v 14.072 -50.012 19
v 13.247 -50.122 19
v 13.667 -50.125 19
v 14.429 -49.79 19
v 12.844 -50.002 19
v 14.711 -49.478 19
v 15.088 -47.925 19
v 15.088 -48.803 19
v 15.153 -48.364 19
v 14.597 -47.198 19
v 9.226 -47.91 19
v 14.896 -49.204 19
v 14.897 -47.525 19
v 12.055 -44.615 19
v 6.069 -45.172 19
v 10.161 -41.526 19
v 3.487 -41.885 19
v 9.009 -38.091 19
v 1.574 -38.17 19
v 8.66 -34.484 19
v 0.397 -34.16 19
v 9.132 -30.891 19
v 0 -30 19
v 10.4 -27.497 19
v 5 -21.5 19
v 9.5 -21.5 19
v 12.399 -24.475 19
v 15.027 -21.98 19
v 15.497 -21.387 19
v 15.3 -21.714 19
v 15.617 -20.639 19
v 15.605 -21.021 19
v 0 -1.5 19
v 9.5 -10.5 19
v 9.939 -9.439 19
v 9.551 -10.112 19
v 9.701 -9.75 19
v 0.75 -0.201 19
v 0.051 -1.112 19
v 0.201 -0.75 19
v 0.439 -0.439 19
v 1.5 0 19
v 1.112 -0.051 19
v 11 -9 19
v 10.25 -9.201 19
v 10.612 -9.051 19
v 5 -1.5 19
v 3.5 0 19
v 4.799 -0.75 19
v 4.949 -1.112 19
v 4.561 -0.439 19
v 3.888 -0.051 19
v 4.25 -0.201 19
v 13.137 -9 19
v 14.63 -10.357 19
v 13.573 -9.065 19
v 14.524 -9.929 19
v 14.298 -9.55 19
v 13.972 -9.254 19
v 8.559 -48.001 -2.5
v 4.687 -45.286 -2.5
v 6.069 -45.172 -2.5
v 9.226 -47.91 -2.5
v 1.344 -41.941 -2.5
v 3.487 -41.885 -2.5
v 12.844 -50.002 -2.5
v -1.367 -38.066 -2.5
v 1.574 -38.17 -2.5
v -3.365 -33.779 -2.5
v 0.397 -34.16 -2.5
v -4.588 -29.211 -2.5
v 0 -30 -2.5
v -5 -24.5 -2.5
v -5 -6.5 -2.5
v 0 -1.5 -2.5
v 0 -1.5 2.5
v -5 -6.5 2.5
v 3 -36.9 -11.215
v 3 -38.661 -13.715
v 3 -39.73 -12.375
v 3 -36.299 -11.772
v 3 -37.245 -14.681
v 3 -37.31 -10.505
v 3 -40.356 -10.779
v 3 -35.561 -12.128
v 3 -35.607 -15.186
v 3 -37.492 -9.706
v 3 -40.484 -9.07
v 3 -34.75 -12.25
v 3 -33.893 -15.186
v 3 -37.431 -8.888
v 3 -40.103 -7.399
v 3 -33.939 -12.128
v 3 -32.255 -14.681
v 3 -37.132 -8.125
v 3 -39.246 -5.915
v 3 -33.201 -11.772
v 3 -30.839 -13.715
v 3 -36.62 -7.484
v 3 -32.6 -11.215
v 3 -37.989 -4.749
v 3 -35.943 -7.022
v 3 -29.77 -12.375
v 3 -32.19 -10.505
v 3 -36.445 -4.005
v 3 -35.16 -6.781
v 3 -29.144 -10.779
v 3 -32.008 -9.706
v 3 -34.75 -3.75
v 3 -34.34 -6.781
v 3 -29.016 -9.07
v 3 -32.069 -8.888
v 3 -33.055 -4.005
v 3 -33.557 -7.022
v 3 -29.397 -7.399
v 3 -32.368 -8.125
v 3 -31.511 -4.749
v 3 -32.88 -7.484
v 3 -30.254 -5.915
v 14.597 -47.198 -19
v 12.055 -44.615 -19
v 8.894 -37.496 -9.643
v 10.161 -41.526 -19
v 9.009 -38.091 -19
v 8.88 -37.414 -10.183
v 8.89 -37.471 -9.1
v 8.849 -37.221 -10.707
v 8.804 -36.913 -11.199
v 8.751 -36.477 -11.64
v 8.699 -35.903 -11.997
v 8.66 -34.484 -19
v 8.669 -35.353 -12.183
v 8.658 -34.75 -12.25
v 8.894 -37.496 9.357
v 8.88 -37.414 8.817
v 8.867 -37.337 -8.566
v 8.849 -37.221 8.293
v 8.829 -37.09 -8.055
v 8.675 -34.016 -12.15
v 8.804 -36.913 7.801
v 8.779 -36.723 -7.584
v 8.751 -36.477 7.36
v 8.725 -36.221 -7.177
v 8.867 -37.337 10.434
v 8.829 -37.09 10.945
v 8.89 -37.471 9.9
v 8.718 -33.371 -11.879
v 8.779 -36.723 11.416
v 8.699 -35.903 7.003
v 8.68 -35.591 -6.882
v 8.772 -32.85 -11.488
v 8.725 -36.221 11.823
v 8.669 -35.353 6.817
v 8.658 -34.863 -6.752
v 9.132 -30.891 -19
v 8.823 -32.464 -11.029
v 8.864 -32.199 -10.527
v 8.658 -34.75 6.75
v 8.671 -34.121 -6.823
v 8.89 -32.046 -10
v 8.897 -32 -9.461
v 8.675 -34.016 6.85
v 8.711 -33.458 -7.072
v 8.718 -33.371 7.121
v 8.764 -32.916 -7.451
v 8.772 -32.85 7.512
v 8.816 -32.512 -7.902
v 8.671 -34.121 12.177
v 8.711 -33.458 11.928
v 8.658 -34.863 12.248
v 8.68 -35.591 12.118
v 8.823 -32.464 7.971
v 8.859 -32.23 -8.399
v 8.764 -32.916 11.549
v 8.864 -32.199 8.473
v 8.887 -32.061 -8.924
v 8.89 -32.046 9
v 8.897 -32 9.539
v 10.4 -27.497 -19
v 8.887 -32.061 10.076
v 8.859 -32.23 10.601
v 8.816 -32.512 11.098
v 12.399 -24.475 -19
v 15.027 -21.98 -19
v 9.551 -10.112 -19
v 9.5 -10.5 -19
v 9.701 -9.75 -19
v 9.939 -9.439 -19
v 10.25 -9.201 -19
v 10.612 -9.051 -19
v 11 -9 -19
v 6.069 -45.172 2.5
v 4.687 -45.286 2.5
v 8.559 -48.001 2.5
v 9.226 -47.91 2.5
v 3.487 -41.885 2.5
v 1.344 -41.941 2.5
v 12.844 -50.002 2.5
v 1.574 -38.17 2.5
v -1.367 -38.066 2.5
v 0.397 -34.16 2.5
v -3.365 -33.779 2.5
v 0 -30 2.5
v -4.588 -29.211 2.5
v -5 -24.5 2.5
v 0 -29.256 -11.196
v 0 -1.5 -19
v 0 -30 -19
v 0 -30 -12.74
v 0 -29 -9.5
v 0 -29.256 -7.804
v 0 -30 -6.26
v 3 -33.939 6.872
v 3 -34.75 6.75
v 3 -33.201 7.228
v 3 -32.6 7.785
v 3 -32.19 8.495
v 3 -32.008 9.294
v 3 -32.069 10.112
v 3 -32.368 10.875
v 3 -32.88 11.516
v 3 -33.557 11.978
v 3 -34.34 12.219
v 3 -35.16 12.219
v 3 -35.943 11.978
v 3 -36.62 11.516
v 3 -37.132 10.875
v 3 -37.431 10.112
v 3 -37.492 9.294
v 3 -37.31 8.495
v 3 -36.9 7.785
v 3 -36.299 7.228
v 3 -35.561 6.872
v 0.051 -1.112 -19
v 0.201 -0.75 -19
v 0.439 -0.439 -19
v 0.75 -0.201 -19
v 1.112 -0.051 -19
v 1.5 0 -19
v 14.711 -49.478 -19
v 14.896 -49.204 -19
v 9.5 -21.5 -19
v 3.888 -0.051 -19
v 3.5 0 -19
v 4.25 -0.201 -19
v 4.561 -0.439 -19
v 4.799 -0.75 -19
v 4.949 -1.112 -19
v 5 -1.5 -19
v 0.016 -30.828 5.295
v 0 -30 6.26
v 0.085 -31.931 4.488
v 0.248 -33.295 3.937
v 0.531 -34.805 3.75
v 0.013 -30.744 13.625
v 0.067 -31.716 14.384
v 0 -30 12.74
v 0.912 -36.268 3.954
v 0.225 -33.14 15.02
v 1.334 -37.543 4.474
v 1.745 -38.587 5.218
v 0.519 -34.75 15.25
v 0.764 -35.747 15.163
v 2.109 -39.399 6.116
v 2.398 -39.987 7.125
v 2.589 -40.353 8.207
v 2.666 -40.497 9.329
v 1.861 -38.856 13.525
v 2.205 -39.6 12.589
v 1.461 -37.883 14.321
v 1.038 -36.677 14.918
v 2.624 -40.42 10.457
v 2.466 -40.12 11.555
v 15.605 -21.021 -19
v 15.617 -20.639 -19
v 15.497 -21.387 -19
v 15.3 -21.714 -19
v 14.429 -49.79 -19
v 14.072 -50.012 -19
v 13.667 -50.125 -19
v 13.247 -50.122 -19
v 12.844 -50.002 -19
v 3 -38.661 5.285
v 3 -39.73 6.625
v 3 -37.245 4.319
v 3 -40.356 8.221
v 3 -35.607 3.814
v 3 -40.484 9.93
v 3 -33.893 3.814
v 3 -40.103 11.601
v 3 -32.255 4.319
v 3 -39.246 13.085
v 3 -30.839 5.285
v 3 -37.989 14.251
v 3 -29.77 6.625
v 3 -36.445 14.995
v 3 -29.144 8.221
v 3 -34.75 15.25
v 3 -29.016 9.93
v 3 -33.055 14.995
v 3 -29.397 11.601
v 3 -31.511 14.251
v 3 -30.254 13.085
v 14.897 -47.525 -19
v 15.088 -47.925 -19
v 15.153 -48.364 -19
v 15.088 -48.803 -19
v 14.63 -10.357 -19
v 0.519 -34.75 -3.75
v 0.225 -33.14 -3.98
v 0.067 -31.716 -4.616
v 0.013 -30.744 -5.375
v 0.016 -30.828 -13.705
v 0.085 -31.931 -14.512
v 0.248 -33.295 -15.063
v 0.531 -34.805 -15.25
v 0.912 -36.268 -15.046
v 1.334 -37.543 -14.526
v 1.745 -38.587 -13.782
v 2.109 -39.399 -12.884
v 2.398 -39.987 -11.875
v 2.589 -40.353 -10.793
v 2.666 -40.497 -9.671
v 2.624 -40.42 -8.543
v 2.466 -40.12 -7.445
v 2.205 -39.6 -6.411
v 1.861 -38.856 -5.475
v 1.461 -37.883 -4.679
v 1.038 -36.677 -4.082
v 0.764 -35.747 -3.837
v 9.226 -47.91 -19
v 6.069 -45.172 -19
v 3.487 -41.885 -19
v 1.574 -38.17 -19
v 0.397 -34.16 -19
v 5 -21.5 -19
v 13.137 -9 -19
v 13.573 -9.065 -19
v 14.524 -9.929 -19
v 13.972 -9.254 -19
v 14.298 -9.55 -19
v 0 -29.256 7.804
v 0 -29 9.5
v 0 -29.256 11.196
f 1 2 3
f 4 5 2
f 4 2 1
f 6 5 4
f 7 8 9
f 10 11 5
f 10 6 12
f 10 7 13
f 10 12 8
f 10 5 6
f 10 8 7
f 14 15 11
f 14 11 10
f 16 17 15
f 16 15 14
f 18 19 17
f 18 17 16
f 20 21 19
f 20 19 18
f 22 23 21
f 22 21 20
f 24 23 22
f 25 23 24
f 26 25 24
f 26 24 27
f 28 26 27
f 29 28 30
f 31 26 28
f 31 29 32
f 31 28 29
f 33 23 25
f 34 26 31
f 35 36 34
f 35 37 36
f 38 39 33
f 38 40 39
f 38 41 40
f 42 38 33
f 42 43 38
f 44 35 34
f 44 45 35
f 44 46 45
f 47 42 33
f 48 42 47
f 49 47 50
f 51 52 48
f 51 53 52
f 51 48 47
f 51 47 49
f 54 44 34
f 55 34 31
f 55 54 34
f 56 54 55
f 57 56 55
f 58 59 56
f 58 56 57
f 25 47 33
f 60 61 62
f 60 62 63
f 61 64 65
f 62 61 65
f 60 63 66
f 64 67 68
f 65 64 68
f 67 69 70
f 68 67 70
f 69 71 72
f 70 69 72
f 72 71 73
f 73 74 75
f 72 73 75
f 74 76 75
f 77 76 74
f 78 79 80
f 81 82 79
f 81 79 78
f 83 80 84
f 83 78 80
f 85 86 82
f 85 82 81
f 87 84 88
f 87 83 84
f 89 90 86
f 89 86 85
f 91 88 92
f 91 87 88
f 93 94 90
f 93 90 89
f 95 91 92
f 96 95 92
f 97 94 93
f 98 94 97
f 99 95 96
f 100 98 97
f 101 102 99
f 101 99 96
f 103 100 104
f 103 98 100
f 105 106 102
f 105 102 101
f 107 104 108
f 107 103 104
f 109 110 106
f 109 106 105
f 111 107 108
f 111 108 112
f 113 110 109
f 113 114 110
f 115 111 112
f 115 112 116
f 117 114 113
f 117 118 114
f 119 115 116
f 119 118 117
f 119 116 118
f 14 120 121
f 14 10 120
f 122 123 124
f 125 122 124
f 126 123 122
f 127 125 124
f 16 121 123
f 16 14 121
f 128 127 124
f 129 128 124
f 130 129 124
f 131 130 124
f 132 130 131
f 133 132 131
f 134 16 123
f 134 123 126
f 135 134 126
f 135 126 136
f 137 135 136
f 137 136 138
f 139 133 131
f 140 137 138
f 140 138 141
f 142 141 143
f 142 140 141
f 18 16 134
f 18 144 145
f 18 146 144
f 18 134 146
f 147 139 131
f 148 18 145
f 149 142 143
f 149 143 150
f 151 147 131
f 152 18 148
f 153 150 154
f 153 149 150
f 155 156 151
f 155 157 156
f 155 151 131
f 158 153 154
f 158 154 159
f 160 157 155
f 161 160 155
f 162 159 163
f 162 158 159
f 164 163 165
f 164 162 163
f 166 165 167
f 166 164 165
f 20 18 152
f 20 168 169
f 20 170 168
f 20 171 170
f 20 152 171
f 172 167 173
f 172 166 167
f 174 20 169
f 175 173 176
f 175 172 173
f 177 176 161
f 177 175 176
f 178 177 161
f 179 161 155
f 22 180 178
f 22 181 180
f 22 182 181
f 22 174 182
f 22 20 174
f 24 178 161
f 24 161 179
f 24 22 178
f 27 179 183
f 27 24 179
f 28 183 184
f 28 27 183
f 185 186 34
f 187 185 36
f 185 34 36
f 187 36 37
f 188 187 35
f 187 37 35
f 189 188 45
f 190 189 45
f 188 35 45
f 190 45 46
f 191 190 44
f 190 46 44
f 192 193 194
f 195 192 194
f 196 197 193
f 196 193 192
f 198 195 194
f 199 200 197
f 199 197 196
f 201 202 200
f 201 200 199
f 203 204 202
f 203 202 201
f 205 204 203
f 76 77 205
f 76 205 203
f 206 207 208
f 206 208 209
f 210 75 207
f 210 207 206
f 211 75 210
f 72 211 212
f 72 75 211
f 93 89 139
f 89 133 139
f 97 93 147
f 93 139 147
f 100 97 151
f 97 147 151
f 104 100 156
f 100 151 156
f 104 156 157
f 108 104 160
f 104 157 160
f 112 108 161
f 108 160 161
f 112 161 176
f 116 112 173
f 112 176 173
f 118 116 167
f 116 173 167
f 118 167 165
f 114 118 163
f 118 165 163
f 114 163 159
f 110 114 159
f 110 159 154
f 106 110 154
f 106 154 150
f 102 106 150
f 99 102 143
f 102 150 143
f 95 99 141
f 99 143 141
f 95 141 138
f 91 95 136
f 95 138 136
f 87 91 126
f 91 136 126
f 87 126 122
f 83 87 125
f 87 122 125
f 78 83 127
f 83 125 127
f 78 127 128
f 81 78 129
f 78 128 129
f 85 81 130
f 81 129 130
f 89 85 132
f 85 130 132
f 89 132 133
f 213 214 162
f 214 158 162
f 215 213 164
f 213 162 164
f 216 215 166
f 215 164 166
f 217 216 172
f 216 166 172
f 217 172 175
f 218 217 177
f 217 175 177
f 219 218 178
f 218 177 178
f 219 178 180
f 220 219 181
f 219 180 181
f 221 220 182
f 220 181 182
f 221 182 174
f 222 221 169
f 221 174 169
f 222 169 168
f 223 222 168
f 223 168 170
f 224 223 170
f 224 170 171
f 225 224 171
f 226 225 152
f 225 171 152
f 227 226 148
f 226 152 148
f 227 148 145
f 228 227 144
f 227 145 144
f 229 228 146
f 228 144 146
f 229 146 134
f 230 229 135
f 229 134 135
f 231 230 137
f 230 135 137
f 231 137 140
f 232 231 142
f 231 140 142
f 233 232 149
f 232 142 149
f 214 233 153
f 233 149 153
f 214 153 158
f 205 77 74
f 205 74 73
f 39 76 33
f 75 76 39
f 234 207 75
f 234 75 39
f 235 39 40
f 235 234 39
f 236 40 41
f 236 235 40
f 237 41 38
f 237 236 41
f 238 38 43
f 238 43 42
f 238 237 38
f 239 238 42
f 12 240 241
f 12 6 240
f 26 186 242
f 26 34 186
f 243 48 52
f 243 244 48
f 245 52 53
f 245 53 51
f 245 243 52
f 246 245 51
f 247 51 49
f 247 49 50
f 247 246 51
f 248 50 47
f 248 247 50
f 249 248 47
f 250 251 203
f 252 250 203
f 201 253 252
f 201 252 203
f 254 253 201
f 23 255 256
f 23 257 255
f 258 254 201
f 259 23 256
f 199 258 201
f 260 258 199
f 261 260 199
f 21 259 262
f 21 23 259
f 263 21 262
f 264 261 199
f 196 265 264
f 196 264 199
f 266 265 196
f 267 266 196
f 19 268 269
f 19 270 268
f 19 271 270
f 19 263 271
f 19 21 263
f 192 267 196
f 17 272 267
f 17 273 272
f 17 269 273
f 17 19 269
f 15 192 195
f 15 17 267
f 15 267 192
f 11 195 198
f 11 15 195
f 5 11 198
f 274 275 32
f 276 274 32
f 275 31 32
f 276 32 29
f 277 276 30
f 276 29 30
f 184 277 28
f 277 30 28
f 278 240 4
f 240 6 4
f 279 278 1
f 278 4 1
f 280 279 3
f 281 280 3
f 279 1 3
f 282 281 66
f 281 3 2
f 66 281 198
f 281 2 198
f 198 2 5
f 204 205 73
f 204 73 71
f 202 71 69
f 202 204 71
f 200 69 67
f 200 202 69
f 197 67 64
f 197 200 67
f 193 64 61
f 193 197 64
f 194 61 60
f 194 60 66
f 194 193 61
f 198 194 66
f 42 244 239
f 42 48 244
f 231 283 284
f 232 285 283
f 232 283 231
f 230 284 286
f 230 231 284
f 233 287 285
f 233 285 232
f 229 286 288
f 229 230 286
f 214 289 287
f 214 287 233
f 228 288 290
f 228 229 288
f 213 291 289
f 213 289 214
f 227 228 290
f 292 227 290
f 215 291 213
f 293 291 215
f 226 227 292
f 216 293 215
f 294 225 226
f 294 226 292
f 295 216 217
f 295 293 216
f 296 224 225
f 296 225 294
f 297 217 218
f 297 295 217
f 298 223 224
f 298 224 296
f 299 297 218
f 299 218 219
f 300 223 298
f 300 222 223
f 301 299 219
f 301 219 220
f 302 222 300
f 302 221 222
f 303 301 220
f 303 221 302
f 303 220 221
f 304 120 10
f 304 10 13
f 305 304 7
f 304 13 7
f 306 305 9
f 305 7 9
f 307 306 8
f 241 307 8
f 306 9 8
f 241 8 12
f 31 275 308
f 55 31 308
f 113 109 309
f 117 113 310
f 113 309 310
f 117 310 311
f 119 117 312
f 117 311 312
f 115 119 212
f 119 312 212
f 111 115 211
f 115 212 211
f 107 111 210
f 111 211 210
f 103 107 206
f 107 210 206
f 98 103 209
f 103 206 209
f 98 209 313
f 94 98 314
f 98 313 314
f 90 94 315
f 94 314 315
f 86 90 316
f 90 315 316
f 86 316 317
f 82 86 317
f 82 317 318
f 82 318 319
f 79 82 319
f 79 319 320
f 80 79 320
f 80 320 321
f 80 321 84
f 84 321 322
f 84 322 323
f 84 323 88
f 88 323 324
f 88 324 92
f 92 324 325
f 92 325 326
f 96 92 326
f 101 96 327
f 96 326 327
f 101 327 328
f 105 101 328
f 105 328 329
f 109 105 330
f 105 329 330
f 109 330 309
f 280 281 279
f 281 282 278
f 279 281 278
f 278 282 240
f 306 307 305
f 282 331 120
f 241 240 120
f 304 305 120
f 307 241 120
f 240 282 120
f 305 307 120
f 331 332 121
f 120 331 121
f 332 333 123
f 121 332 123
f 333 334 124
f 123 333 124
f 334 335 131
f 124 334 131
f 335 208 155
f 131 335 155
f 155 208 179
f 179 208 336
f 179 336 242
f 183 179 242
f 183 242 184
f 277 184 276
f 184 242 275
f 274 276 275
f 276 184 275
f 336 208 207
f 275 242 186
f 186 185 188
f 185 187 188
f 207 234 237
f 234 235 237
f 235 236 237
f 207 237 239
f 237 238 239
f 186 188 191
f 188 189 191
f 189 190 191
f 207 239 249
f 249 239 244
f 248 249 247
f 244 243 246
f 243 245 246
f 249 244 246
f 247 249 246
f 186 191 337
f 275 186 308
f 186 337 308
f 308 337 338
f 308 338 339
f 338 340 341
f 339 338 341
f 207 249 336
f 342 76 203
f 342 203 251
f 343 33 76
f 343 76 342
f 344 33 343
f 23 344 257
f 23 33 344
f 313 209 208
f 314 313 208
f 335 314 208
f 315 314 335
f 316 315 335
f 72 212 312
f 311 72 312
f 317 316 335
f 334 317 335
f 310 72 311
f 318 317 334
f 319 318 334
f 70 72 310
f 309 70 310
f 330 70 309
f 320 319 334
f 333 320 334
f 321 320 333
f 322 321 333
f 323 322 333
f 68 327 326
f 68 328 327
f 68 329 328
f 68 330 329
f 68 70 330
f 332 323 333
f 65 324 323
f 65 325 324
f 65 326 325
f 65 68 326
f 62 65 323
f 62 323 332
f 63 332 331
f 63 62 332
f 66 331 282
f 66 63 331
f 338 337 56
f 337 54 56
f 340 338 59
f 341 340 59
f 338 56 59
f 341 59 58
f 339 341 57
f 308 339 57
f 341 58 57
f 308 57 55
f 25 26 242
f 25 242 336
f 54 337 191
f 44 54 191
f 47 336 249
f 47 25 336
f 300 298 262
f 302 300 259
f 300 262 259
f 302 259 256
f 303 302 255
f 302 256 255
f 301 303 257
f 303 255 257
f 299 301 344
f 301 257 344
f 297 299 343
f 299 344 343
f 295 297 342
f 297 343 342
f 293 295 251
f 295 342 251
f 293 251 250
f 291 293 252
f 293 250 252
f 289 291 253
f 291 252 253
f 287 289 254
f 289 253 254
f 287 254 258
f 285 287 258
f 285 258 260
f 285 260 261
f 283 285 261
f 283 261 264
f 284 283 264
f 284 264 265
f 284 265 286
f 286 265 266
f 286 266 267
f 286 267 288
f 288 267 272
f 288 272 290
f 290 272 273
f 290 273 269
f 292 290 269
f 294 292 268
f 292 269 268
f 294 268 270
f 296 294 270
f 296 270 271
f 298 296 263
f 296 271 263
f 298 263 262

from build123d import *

# Parameters (mm, degrees)
RESSALTO_EXTRUS_O1_DEPTH                             = 19
FILETE1_R                                            = 1.5
RESSALTO_EXTRUS_O2_DEPTH                             = 2.5
REBAIXO_PARA_PARAFUSO_ALLEN_SEXTAVADO_DE_D           = 5.5
REBAIXO_PARA_PARAFUSO_ALLEN_SEXTAVADO_DE_CBORE_D     = 11.5
REBAIXO_PARA_PARAFUSO_ALLEN_SEXTAVADO_DE_CBORE_DEPTH = 3


with BuildPart() as part:
    # Esboço1 → Ressalto-extrusão1 (new, symmetric)
    with BuildSketch(Plane.XY):
        with BuildLine():
            Line((0, 0), (0, -30))
            ThreePointArc((0, -30), (3.840309651, -42.417932709), (14.020349891, -50.5))
            Line((14.020349891, -50.5), (15.7, -48.014285714))
            ThreePointArc((15.7, -48.014285714), (8.658133916, -34.757142857), (15.7, -21.5))
            Line((15.7, -21.5), (14.5, -9))
            Line((14.5, -9), (9.5, -9))
            Line((9.5, -9), (9.5, -21.5))
            Line((9.5, -21.5), (5, -21.5))
            Line((5, -21.5), (5, 0))
            Line((5, 0), (0, 0))
        make_face()
    extrude(amount=RESSALTO_EXTRUS_O1_DEPTH, both=True)

    # Filete1
    filete1_edges = [part.edges().sort_by_distance(p)[0] for p in [
        (5, 0, 0),
        (9.5, -9, 0),
        (14.5, -9, 0),
        (15.7, -21.5, 0),
        (15.7, -48.014285714, 0),
        (14.020349891, -50.5, 0),
        (0, 0, 0),
    ]]
    fillet(filete1_edges, radius=FILETE1_R)

    # Esboço3 → Ressalto-extrusão2 (add, symmetric)
    with BuildSketch(Plane.XY):
        with BuildLine():
            Line((0, -1.5), (-5, -6.5))
            Line((-5, -6.5), (-5, -24.5))
            ThreePointArc((-5, -24.5), (-0.096122461, -40.062531476), (12.8437502, -50.002355236))
            ThreePointArc((12.8437502, -50.002355236), (3.487375513, -41.885454705), (0, -30))
            Line((0, -30), (0, -1.5))
        make_face()
    extrude(amount=RESSALTO_EXTRUS_O2_DEPTH, both=True)

    # Rebaixo para parafuso Allen sextavado de M51 (through all)
    with Locations(Plane.ZY):
        with Locations((-9.5, -34.75), (9.5, -34.75)):
            CounterBoreHole(REBAIXO_PARA_PARAFUSO_ALLEN_SEXTAVADO_DE_D / 2, REBAIXO_PARA_PARAFUSO_ALLEN_SEXTAVADO_DE_CBORE_D / 2, REBAIXO_PARA_PARAFUSO_ALLEN_SEXTAVADO_DE_CBORE_DEPTH)


solid = part.part
